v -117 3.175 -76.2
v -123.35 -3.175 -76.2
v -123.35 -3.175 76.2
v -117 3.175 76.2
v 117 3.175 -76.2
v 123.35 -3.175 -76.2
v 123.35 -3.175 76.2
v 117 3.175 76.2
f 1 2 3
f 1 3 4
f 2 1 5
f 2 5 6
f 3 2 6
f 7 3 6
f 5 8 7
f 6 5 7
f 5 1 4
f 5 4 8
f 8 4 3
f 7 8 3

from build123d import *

# Parameters (mm, degrees)
SKETCH2_W           = 254
SKETCH2_H           = 152.4
BOSS_EXTRUDE1_DEPTH = 3.175
CHAMFER1_SIZE       = 10
CHAMFER2_SIZE       = 10


with BuildPart() as part:
    # Sketch2 → Boss-Extrude1 (new, symmetric)
    with BuildSketch(Plane(origin=(0, 0, 0), x_dir=(1, 0, 0), z_dir=(0, 1, 0))):
        Rectangle(SKETCH2_W, SKETCH2_H)
    extrude(amount=BOSS_EXTRUDE1_DEPTH, both=True)

    # Chamfer1
    # the kernel refuses this chamfer: 10 mm, written as the material it takes off along each edge
    with BuildSketch(Plane(origin=(-127, 3.175, -101.91682988), x_dir=(-0.027495876610586317, -0.9996219169112968, 0), z_dir=(0, 0, 1))) as chamfer1_piece_1:
        Polygon((CHAMFER1_SIZE * 0.999621916911, CHAMFER1_SIZE * 0.0274958766106), (-CHAMFER1_SIZE * 0.0274958766106, CHAMFER1_SIZE * 0.999621916911), (0, 0), align=None)
    extrude(amount=203.833659759, mode=Mode.SUBTRACT)

    # Chamfer2
    # the kernel refuses this chamfer: 10 mm, written as the material it takes off along each edge
    with BuildSketch(Plane(origin=(127, 3.175, 101.91682988), x_dir=(-0.9996219169112968, 0.02749587661058636, 0), z_dir=(0, 0, -1))) as chamfer2_piece_1:
        Polygon((CHAMFER2_SIZE * 0.999621916911, -CHAMFER2_SIZE * 0.0274958766106), (-CHAMFER2_SIZE * 0.0274958766106, -CHAMFER2_SIZE * 0.999621916911), (0, 0), align=None)
    extrude(amount=203.833659759, mode=Mode.SUBTRACT)


solid = part.part
